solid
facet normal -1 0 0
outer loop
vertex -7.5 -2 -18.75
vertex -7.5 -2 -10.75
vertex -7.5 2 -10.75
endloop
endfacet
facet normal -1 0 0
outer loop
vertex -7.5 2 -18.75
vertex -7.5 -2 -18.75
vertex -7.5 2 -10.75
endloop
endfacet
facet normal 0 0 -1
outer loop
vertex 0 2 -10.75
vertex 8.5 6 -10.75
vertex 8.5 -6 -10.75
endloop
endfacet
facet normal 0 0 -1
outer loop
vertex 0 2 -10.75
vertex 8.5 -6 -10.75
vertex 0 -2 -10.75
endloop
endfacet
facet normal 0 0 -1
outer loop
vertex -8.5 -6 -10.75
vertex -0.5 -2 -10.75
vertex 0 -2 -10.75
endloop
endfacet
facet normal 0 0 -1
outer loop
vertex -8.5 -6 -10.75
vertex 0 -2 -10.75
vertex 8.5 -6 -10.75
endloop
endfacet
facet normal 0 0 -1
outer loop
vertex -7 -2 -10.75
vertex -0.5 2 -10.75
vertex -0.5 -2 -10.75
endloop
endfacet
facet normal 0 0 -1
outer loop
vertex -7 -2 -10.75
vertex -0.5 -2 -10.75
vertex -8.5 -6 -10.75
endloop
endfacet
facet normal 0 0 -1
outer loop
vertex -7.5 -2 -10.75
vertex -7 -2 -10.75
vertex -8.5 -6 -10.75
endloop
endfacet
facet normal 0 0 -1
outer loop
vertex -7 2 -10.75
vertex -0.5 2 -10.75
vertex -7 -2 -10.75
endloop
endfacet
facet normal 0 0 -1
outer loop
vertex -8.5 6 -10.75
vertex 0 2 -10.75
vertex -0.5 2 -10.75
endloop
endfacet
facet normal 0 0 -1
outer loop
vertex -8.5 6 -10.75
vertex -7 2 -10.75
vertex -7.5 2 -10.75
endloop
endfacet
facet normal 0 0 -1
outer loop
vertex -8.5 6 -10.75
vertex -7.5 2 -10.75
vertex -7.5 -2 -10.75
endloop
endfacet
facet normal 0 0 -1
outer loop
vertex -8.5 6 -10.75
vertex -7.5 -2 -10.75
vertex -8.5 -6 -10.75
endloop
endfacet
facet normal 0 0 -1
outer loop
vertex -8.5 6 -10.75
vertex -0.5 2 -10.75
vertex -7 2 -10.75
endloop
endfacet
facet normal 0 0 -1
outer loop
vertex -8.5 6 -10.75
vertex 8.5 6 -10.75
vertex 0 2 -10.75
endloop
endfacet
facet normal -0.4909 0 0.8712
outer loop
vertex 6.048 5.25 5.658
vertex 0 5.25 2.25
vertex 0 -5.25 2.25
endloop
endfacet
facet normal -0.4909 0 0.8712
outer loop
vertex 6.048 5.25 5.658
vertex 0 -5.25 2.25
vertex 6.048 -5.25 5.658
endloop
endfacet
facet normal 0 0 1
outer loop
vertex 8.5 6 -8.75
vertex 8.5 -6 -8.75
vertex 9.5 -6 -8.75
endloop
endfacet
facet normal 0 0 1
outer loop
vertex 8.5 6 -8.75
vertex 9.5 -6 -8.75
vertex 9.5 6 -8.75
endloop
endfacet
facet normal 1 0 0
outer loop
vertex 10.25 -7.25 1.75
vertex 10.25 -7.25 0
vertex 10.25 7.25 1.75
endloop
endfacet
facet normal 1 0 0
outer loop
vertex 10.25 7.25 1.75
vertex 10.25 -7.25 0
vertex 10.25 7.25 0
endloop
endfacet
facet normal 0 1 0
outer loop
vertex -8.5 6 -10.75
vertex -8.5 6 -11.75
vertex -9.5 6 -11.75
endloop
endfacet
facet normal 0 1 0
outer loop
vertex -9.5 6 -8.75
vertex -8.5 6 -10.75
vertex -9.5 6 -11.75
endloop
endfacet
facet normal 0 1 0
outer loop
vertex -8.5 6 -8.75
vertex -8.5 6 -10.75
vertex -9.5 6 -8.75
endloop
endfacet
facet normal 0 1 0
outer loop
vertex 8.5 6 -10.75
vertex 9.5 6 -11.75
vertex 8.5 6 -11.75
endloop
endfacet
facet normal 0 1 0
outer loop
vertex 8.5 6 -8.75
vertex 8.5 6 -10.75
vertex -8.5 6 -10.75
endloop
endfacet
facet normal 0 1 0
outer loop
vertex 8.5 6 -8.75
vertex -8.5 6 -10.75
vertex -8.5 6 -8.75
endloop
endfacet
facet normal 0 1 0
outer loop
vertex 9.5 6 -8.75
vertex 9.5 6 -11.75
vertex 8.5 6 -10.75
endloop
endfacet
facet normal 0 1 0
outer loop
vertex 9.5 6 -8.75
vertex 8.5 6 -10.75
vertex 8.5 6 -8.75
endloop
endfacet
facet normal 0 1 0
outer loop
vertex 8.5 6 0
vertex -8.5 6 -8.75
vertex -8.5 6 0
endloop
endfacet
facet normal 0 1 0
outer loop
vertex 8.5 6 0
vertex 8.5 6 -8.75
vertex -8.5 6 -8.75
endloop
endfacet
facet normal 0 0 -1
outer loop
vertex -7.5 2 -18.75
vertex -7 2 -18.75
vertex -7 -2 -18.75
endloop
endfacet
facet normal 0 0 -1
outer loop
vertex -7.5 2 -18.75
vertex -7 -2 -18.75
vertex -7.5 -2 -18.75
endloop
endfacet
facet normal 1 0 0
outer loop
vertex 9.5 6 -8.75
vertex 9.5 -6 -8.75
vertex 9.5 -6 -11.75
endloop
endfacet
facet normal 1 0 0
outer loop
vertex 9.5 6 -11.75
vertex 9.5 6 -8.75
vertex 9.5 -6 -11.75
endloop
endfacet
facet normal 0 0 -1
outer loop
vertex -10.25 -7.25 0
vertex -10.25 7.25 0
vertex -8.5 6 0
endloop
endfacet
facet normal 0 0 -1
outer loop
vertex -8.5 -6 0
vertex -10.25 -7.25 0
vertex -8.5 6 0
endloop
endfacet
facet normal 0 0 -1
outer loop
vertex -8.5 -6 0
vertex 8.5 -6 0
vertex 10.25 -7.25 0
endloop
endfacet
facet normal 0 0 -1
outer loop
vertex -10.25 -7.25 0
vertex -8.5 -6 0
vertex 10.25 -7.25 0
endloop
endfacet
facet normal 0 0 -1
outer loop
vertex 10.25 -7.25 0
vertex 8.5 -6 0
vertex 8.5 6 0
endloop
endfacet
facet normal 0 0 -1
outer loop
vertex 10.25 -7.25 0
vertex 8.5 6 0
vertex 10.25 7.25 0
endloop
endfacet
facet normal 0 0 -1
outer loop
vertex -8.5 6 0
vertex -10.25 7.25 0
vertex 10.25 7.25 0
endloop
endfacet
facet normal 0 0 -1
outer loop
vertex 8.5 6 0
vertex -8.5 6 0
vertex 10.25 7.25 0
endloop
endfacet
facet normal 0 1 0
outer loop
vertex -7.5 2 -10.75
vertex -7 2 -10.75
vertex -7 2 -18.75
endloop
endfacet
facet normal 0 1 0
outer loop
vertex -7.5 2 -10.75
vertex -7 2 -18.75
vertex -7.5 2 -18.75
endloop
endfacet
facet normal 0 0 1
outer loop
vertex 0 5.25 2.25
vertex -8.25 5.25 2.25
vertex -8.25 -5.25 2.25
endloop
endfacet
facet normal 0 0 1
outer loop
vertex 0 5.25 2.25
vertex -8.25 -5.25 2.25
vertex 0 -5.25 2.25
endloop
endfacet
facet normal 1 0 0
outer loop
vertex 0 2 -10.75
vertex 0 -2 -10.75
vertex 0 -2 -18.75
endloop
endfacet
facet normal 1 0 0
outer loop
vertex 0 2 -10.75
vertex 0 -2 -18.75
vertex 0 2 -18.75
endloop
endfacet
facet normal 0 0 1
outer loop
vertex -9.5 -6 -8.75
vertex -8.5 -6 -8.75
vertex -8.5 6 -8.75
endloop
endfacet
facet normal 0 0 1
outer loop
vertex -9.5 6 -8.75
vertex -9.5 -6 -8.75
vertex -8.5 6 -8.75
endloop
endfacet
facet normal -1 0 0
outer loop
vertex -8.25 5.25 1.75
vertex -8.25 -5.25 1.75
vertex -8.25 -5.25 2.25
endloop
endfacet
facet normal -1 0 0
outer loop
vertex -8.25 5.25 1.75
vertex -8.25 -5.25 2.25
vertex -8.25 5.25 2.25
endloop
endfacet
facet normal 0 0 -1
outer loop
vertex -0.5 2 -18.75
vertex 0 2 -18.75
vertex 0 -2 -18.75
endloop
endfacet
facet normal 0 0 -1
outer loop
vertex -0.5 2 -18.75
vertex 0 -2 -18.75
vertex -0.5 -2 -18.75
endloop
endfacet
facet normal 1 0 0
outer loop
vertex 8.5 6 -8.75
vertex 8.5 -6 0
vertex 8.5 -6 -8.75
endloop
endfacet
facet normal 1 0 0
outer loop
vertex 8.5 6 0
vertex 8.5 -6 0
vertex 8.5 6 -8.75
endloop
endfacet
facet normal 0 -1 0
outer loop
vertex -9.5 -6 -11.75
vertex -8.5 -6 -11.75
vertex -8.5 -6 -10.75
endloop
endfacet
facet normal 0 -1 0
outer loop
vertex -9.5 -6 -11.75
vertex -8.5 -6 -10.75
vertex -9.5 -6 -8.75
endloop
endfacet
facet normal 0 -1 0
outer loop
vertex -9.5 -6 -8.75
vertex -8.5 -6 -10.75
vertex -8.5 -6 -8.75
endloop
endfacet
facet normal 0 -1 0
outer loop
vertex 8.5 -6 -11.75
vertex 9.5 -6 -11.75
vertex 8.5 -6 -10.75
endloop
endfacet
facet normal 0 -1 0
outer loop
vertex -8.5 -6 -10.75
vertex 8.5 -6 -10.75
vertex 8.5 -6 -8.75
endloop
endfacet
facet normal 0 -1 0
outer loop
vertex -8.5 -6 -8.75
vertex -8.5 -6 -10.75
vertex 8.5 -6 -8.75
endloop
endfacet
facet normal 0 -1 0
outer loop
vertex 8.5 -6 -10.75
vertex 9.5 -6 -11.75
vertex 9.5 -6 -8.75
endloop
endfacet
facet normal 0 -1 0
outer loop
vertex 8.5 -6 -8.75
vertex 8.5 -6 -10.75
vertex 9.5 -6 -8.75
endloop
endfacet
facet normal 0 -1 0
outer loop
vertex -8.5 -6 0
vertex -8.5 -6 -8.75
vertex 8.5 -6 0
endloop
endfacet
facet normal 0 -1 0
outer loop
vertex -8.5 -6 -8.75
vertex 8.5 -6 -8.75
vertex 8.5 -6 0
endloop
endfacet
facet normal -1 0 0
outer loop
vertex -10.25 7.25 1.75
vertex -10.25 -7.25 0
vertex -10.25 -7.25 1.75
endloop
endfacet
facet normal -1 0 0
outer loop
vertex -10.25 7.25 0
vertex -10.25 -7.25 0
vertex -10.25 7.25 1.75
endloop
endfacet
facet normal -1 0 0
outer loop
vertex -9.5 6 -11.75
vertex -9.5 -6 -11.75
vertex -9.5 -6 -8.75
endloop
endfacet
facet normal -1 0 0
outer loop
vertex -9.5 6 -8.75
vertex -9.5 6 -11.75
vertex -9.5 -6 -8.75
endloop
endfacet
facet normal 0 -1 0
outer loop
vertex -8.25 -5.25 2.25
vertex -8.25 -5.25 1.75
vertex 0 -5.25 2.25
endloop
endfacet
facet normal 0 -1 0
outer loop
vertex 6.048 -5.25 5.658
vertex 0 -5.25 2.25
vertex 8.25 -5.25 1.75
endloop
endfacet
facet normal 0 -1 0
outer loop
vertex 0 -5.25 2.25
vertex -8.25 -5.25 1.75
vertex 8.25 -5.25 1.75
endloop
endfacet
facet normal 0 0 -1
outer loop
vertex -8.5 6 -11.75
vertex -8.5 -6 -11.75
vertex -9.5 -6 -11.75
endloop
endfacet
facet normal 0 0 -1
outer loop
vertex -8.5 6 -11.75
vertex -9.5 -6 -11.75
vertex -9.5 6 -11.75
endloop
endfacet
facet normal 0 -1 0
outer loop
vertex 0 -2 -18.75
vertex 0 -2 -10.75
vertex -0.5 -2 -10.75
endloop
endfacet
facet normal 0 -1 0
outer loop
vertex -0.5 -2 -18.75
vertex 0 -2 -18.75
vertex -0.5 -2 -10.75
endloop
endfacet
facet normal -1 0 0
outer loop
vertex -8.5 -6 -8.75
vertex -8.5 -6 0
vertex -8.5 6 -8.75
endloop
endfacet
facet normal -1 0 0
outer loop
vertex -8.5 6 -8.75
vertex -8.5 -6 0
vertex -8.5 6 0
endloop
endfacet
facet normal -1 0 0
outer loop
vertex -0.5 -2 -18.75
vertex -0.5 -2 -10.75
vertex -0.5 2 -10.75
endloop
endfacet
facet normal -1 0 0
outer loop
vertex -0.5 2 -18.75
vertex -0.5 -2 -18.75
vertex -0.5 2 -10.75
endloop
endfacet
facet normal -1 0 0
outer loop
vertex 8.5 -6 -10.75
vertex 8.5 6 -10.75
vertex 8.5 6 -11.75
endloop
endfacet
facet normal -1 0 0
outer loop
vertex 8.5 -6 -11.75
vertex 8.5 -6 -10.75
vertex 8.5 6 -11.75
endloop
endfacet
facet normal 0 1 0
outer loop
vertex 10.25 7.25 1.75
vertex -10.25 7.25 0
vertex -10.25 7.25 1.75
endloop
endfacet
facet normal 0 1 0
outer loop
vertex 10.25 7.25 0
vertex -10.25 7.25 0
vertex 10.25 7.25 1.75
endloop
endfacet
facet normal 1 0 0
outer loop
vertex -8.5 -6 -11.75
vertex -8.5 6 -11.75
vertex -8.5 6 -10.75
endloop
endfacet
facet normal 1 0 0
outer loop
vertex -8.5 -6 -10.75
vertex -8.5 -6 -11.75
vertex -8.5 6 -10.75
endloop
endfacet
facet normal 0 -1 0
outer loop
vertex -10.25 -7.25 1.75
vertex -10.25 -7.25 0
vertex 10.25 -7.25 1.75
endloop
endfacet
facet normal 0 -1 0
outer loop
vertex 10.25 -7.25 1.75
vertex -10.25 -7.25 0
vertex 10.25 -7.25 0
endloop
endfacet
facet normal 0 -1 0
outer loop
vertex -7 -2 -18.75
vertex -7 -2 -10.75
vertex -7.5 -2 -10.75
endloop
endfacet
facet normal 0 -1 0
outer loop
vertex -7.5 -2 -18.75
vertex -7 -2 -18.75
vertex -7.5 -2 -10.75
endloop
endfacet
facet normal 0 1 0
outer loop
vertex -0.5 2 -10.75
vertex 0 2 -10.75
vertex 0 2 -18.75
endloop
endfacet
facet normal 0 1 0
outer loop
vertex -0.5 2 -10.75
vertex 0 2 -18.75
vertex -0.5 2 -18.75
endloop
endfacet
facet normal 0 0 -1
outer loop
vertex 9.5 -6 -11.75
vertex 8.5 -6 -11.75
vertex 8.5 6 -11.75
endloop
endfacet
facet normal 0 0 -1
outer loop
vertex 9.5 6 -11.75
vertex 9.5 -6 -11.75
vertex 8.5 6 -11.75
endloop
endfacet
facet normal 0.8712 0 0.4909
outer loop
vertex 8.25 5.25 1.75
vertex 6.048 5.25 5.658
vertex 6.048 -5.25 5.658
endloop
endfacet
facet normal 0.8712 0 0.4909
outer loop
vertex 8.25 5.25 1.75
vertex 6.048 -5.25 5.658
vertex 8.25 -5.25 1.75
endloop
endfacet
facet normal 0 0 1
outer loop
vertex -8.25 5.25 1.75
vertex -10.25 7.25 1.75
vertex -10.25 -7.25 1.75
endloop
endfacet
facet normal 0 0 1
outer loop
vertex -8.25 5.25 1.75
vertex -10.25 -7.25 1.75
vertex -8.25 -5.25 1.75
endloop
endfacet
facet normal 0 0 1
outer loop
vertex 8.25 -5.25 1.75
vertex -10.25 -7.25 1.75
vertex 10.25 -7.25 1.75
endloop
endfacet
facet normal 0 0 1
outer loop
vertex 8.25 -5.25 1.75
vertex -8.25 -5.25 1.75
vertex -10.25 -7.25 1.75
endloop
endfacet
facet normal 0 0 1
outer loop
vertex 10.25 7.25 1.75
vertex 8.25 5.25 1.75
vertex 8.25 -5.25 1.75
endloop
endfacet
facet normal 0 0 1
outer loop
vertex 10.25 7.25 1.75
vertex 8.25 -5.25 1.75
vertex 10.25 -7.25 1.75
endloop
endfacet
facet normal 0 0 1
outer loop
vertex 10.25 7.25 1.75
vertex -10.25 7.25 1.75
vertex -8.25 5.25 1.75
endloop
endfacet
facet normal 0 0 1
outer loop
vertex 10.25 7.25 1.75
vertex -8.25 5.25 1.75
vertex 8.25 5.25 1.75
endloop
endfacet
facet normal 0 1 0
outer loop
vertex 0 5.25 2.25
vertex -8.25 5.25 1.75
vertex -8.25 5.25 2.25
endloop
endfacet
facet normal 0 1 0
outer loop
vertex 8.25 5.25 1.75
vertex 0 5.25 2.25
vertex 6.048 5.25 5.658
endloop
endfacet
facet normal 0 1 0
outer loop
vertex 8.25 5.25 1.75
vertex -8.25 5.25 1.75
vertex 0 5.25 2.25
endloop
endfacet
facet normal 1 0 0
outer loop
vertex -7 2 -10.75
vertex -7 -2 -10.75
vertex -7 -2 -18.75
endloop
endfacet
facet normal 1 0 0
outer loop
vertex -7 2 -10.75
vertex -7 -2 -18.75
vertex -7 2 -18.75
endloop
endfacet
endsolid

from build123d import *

# Parameters (mm, degrees)
SCHIZZO1_W                   = 20.5
SCHIZZO1_H                   = 14.5
ESTRUSIONE_ESTRUSIONE1_DEPTH = 1.75
SCHIZZO2_W                   = 17
SCHIZZO2_H                   = 12
ESTRUSIONE_ESTRUSIONE2_DEPTH = 10.75
SCHIZZO3_W                   = 3
SCHIZZO3_H                   = 12
ESTRUSIONE_ESTRUSIONE3_DEPTH = 1
SCHIZZO4_W                   = 3
SCHIZZO4_H                   = 12
ESTRUSIONE_ESTRUSIONE4_DEPTH = 1
SCHIZZO6_W                   = 8.25
SCHIZZO6_H                   = 10.5
ESTRUSIONE_ESTRUSIONE5_DEPTH = 0.5
ESTRUSIONE_ESTRUSIONE6_DEPTH = 10.5
SCHIZZO9_W                   = 0.5
SCHIZZO9_H                   = 4
ESTRUSIONE_ESTRUSIONE7_DEPTH = 8


with BuildPart() as part:
    # Schizzo1 → Estrusione-Estrusione1 (new body)
    with BuildSketch(Plane.XY):
        Rectangle(SCHIZZO1_W, SCHIZZO1_H)
    extrude(amount=ESTRUSIONE_ESTRUSIONE1_DEPTH)

    # Schizzo2 → Estrusione-Estrusione2 (add)
    with BuildSketch(Plane(origin=(0, 0, 0), x_dir=(-1, 0, 0), z_dir=(0, 0, -1))):
        Rectangle(SCHIZZO2_W, SCHIZZO2_H)
    extrude(amount=ESTRUSIONE_ESTRUSIONE2_DEPTH)

    # Schizzo3 → Estrusione-Estrusione3 (add)
    with BuildSketch(Plane(origin=(8.5, 0, 0), x_dir=(0, 0, -1), z_dir=(1, 0, 0))):
        with Locations((10.25, 0)):
            Rectangle(SCHIZZO3_W, SCHIZZO3_H)
    extrude(amount=ESTRUSIONE_ESTRUSIONE3_DEPTH)

    # Schizzo4 → Estrusione-Estrusione4 (add)
    with BuildSketch(Plane.ZY.offset(8.5)):
        with Locations((-10.25, 0)):
            Rectangle(SCHIZZO4_W, SCHIZZO4_H)
    extrude(amount=ESTRUSIONE_ESTRUSIONE4_DEPTH)

    # Schizzo6 → Estrusione-Estrusione5 (add)
    with BuildSketch(Plane.XY.offset(1.75)):
        with Locations((-4.125, 0)):
            Rectangle(SCHIZZO6_W, SCHIZZO6_H)
    extrude(amount=ESTRUSIONE_ESTRUSIONE5_DEPTH)

    # Schizzo8 → Estrusione-Estrusione6 (add)
    with BuildSketch(Plane(origin=(0, 5.25, 0), x_dir=(1, 0, 0), z_dir=(0, 1, 0))):
        Polygon((0, -2.25), (6.048387887, -5.65769108), (8.25, -1.75), (0, -1.75), align=None)
    extrude(amount=-ESTRUSIONE_ESTRUSIONE6_DEPTH)

    # Schizzo9 → Estrusione-Estrusione7 (add)
    with BuildSketch(Plane(origin=(0, 0, -10.75), x_dir=(-1, 0, 0), z_dir=(0, 0, -1))):
        with Locations((7.25, 0)):
            Rectangle(SCHIZZO9_W, SCHIZZO9_H)
        with Locations((0.25, 0)):
            Rectangle(SCHIZZO9_W, SCHIZZO9_H)
    extrude(amount=ESTRUSIONE_ESTRUSIONE7_DEPTH)


solid = part.part
